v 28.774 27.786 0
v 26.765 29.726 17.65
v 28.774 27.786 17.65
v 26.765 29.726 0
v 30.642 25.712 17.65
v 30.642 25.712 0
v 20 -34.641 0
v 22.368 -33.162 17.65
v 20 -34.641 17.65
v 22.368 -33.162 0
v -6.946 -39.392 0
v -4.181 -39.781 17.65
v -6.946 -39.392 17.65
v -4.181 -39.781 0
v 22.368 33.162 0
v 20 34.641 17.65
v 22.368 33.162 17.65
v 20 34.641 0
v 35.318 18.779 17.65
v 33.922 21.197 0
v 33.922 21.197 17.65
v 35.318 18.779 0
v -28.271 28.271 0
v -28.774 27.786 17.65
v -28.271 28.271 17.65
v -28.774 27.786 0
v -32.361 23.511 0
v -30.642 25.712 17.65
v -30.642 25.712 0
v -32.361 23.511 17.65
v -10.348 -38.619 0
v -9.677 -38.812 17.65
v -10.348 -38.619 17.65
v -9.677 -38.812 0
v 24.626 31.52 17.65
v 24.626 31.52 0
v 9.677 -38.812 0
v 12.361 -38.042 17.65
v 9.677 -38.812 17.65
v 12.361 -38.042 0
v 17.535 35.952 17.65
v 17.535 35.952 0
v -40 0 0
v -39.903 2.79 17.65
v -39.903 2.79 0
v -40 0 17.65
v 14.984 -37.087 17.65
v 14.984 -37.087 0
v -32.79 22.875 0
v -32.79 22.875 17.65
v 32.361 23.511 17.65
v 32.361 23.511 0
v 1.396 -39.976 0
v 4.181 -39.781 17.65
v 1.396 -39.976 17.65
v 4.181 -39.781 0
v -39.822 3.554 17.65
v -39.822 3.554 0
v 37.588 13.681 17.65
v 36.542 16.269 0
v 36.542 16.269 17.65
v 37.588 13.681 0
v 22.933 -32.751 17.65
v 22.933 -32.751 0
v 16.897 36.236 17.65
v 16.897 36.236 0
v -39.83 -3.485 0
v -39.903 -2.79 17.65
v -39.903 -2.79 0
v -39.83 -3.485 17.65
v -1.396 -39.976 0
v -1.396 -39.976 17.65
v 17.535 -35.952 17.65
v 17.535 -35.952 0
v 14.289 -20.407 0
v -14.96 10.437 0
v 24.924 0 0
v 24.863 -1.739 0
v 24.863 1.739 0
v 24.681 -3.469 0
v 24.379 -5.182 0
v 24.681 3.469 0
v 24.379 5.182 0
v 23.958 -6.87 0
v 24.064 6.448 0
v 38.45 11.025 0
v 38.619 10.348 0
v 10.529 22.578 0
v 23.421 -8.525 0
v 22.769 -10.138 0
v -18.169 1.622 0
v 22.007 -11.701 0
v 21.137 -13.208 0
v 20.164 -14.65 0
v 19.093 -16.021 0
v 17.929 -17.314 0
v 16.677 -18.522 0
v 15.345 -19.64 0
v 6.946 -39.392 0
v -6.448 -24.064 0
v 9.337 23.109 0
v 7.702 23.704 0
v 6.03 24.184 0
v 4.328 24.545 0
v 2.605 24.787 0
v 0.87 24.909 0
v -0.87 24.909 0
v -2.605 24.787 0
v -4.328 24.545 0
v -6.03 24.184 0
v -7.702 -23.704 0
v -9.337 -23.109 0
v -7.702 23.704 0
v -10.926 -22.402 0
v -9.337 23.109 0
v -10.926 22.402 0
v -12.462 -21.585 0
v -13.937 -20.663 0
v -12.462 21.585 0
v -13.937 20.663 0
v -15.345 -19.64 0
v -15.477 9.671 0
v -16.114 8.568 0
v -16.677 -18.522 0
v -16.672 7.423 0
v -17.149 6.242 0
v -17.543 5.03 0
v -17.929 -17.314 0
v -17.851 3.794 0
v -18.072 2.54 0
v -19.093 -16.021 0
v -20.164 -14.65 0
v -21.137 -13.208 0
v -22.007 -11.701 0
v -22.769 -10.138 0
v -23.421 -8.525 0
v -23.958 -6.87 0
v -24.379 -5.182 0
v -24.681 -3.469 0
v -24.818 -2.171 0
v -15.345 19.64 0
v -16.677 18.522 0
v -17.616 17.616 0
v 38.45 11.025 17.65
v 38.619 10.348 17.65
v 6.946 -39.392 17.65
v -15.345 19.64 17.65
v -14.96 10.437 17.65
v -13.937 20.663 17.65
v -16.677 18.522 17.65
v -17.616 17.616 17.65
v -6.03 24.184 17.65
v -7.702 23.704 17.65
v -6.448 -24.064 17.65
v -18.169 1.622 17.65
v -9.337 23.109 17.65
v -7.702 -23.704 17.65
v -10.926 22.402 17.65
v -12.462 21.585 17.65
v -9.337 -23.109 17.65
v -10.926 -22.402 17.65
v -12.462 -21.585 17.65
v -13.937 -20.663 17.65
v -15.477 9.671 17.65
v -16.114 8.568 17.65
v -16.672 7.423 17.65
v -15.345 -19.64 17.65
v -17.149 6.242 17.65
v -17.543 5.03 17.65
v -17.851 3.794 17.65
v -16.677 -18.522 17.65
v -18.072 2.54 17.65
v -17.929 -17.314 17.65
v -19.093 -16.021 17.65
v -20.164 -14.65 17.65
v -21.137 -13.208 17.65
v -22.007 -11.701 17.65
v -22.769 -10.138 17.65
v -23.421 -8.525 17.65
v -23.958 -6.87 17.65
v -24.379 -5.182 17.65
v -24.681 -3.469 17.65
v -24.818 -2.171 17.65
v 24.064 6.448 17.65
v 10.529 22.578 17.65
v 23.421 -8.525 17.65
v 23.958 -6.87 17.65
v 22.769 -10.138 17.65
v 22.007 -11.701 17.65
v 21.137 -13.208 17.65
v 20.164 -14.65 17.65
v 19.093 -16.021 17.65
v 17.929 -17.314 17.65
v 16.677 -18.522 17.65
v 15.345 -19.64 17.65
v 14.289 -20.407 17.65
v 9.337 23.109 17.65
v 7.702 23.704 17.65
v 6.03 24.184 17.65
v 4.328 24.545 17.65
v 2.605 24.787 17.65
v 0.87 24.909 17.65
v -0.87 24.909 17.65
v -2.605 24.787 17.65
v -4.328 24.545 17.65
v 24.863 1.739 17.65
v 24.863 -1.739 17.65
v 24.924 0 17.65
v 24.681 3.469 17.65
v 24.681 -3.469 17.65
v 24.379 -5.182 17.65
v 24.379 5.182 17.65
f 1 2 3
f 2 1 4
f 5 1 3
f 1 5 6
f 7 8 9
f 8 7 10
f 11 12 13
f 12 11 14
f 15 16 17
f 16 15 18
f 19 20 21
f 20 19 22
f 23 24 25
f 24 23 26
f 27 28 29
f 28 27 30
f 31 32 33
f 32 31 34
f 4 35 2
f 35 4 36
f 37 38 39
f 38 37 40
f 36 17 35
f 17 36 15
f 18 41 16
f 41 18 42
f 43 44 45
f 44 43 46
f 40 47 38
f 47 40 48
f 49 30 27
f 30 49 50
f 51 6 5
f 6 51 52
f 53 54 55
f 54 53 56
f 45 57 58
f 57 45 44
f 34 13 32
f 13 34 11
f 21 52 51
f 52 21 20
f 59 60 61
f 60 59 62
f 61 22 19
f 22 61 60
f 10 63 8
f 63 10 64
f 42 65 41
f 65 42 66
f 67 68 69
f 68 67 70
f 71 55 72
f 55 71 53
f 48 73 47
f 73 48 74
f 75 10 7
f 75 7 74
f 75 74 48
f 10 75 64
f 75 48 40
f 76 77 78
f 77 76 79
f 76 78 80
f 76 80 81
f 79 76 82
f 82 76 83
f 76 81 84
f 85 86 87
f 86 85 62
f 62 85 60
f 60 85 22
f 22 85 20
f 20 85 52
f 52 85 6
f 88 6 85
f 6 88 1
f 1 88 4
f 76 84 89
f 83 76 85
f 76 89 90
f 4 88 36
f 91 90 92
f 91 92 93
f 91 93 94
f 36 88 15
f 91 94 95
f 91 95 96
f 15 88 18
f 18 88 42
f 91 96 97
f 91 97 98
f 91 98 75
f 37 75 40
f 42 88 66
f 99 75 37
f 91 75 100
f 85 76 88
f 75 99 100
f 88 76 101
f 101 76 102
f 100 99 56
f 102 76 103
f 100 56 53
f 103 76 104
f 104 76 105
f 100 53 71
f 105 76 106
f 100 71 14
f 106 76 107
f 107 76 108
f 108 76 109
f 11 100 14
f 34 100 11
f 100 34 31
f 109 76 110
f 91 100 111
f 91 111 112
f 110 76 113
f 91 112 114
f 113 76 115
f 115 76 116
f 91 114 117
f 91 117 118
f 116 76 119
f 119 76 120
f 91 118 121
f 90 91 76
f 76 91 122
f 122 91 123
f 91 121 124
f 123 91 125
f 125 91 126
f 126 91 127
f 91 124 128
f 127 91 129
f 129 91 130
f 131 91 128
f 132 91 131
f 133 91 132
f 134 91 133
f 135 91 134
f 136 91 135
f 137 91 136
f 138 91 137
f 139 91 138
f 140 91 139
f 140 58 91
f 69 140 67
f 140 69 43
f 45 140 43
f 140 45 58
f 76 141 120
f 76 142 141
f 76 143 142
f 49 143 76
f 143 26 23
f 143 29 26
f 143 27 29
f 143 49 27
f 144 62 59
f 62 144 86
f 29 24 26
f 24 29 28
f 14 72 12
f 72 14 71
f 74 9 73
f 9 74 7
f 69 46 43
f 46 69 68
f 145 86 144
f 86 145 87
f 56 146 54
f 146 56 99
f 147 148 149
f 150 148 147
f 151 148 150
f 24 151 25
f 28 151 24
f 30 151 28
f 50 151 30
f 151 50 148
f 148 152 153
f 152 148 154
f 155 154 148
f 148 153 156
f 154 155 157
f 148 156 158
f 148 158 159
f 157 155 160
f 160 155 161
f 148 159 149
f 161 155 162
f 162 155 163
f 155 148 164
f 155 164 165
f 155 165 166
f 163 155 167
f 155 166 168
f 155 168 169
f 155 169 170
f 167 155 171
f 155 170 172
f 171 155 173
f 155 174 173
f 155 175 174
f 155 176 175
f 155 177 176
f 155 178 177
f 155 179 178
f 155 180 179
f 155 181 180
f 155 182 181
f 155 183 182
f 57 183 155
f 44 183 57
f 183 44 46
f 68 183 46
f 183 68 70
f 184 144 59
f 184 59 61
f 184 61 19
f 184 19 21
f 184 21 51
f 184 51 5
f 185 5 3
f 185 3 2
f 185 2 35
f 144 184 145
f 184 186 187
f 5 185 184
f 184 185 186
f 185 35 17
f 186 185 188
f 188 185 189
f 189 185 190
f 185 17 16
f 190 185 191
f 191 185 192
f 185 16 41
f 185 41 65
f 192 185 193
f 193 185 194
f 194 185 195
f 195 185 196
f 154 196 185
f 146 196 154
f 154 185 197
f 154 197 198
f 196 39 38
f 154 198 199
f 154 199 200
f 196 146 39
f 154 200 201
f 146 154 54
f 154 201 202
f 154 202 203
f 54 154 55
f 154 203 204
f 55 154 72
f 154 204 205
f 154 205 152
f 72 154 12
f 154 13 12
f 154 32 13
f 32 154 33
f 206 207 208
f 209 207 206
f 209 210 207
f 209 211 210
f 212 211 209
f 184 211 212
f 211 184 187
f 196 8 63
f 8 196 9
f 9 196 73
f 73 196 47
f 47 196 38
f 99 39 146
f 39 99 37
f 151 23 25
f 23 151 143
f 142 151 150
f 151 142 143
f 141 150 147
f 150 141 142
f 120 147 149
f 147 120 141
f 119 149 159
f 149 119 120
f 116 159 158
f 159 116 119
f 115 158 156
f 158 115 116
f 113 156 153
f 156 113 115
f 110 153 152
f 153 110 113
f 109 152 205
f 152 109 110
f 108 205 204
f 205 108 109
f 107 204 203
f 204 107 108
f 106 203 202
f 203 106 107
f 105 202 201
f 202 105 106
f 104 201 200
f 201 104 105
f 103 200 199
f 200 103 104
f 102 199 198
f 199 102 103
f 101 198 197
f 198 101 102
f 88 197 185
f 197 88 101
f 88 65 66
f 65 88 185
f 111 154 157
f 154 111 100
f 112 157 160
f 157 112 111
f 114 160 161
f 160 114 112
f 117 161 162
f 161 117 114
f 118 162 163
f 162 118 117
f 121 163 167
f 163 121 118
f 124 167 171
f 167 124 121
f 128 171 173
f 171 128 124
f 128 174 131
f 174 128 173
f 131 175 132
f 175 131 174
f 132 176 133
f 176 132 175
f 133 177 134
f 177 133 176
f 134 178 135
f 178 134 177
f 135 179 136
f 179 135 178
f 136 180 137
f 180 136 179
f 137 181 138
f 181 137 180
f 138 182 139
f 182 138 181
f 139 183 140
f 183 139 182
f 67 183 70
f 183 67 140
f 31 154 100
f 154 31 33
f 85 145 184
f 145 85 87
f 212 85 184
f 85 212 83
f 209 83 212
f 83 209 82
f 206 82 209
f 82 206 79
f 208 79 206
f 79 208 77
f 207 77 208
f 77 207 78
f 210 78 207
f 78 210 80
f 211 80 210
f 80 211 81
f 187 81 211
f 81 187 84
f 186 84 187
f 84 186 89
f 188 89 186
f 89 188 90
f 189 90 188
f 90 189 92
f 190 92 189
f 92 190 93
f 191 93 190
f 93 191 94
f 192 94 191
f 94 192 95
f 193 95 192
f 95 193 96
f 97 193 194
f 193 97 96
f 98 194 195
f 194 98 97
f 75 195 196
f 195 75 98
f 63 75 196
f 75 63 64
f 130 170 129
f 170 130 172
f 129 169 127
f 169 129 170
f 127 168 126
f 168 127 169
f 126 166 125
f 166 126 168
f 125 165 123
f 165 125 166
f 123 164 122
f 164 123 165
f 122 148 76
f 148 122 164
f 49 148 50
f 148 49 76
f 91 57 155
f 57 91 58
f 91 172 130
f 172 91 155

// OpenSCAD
SCREW_THREAD_SIZE = 19.05;
SCREW_HEAD_SIZE = 4.5;
SOLAR_PLATE_THICKNESS = 7.9;

NEEDED_HEIGHT = SCREW_THREAD_SIZE + SCREW_HEAD_SIZE - SOLAR_PLATE_THICKNESS + 2;

echo("total height padding needed:");
echo(NEEDED_HEIGHT);


$fn = 90;

module arc(r1, r2, a1, a2) {
  difference() {
    difference() {
      polygon([[0,0], [cos(a1) * (r1 + 50), sin(a1) * (r1 + 50)], [cos(a2) * (r1 + 50), sin(a2) * (r1 + 50)]]);
      circle(r = r2);
    }
    difference() {
      circle(r=r1 + 100);
      circle(r=r1);
    }
  }
}

// make a cylinder that is DIFF_NEEDED tall and 80mm diameter


ARC_ANGLE_SCREWS = 70; // 12.3;
ARC_ANGLE_BUBBLE = 29.8;

SCREW_DIAM_NEEDED = 40;  // 4.826

module tempmon_padding() {
    union () {
    difference() {
        cylinder(h=NEEDED_HEIGHT, r=80/2);

        linear_extrude(NEEDED_HEIGHT)
            arc(100, 63.5/2 - 4.826 - 2, 60-ARC_ANGLE_SCREWS/2, 60+ARC_ANGLE_SCREWS/2);
            
        linear_extrude(NEEDED_HEIGHT)
            arc(100, 63.5/2 - 4.826 - 2, 180-ARC_ANGLE_SCREWS/2, 180+ARC_ANGLE_SCREWS/2);

        linear_extrude(NEEDED_HEIGHT)
            arc(100, 63.5/2 - 4.826 - 2, 300-ARC_ANGLE_SCREWS/2, 300+ARC_ANGLE_SCREWS/2);
            
        linear_extrude(NEEDED_HEIGHT)
            arc(100, 63.5/2 - 13.5, 120-ARC_ANGLE_BUBBLE/2, 120+ARC_ANGLE_BUBBLE/2);
            
        
    }
    /*
    difference() {
        cylinder(3, 40, 40);
        cylinder(3, 37, 37);
    }*/
    
    }

    // screw holes for ref
    /*
    translate([cos(60)*63.5/2, sin(60)*63.5/2, 0]) cylinder(h=NEEDED_HEIGHT, r=SCREW_DIAM_NEEDED/2);
    translate([cos(180)*63.5/2, sin(180)*63.5/2, 0]) cylinder(h=NEEDED_HEIGHT, r=SCREW_DIAM_NEEDED/2);
    translate([cos(300)*63.5/2, sin(300)*63.5/2, 0]) cylinder(h=NEEDED_HEIGHT, r=SCREW_DIAM_NEEDED/2);
    translate([cos(120)*(63.5/2 - 11.5/2), sin(120)*(63.5/2 - 11.5/2), 0]) cylinder(h=NEEDED_HEIGHT, r=11.5/2);
    */
}

module pyrgepyra_padding() {
    // need extra height because its extra sensor PLUS padding
    union() {
    difference() {
        cylinder(h=NEEDED_HEIGHT, r=80/2);

        linear_extrude(NEEDED_HEIGHT)
            arc(100, 63.5/2 - 4.826 - 2, 60-ARC_ANGLE_SCREWS/2, 60+ARC_ANGLE_SCREWS/2);
            
        linear_extrude(NEEDED_HEIGHT)
            arc(100, 63.5/2 - 4.826 - 2, 180-ARC_ANGLE_SCREWS/2, 180+ARC_ANGLE_SCREWS/2);

        linear_extrude(NEEDED_HEIGHT)
            arc(100, 63.5/2 - 4.826 - 2, 300-ARC_ANGLE_SCREWS/2, 300+ARC_ANGLE_SCREWS/2);
            
        linear_extrude(NEEDED_HEIGHT)
            arc(100, 63.5/2 - 13.5, 120-ARC_ANGLE_BUBBLE/2, 120+ARC_ANGLE_BUBBLE/2);
            
        // space for cable
            // space for the cable  which is 5mm thick and goes up 8mm 
            // wire path
            // away from the slot
            rotate([0, 0, 0]) {
            
                translate([0, -8/2, 0]) {        
                    cube([60, 8, 10], center = false);
                }
            }
        
    }
        translate([0, 0, NEEDED_HEIGHT]) cylinder(h=7.9, r=80/2);
    }

    // screw holes for ref
    /*
    translate([cos(60)*63.5/2, sin(60)*63.5/2, 0]) cylinder(h=NEEDED_HEIGHT, r=4.826/2);
    translate([cos(180)*63.5/2, sin(180)*63.5/2, 0]) cylinder(h=NEEDED_HEIGHT, r=4.826/2);
    translate([cos(300)*63.5/2, sin(300)*63.5/2, 0]) cylinder(h=NEEDED_HEIGHT, r=4.826/2);
    translate([cos(120)*(63.5/2 - 11.5/2), sin(120)*(63.5/2 - 11.5/2), 0]) cylinder(h=NEEDED_HEIGHT, r=11.5/2);
    */
}




rotate([0,0,40]) tempmon_padding();
/*translate([100, 0, 0]) tempmon_padding();
translate([200, 0, 0]) tempmon_padding();
translate([0, 100, NEEDED_HEIGHT+7.9]) rotate([0,180,60]) pyrgepyra_padding();
translate([100, 100, NEEDED_HEIGHT+7.9]) rotate([0,180,60]) pyrgepyra_padding();
*/
